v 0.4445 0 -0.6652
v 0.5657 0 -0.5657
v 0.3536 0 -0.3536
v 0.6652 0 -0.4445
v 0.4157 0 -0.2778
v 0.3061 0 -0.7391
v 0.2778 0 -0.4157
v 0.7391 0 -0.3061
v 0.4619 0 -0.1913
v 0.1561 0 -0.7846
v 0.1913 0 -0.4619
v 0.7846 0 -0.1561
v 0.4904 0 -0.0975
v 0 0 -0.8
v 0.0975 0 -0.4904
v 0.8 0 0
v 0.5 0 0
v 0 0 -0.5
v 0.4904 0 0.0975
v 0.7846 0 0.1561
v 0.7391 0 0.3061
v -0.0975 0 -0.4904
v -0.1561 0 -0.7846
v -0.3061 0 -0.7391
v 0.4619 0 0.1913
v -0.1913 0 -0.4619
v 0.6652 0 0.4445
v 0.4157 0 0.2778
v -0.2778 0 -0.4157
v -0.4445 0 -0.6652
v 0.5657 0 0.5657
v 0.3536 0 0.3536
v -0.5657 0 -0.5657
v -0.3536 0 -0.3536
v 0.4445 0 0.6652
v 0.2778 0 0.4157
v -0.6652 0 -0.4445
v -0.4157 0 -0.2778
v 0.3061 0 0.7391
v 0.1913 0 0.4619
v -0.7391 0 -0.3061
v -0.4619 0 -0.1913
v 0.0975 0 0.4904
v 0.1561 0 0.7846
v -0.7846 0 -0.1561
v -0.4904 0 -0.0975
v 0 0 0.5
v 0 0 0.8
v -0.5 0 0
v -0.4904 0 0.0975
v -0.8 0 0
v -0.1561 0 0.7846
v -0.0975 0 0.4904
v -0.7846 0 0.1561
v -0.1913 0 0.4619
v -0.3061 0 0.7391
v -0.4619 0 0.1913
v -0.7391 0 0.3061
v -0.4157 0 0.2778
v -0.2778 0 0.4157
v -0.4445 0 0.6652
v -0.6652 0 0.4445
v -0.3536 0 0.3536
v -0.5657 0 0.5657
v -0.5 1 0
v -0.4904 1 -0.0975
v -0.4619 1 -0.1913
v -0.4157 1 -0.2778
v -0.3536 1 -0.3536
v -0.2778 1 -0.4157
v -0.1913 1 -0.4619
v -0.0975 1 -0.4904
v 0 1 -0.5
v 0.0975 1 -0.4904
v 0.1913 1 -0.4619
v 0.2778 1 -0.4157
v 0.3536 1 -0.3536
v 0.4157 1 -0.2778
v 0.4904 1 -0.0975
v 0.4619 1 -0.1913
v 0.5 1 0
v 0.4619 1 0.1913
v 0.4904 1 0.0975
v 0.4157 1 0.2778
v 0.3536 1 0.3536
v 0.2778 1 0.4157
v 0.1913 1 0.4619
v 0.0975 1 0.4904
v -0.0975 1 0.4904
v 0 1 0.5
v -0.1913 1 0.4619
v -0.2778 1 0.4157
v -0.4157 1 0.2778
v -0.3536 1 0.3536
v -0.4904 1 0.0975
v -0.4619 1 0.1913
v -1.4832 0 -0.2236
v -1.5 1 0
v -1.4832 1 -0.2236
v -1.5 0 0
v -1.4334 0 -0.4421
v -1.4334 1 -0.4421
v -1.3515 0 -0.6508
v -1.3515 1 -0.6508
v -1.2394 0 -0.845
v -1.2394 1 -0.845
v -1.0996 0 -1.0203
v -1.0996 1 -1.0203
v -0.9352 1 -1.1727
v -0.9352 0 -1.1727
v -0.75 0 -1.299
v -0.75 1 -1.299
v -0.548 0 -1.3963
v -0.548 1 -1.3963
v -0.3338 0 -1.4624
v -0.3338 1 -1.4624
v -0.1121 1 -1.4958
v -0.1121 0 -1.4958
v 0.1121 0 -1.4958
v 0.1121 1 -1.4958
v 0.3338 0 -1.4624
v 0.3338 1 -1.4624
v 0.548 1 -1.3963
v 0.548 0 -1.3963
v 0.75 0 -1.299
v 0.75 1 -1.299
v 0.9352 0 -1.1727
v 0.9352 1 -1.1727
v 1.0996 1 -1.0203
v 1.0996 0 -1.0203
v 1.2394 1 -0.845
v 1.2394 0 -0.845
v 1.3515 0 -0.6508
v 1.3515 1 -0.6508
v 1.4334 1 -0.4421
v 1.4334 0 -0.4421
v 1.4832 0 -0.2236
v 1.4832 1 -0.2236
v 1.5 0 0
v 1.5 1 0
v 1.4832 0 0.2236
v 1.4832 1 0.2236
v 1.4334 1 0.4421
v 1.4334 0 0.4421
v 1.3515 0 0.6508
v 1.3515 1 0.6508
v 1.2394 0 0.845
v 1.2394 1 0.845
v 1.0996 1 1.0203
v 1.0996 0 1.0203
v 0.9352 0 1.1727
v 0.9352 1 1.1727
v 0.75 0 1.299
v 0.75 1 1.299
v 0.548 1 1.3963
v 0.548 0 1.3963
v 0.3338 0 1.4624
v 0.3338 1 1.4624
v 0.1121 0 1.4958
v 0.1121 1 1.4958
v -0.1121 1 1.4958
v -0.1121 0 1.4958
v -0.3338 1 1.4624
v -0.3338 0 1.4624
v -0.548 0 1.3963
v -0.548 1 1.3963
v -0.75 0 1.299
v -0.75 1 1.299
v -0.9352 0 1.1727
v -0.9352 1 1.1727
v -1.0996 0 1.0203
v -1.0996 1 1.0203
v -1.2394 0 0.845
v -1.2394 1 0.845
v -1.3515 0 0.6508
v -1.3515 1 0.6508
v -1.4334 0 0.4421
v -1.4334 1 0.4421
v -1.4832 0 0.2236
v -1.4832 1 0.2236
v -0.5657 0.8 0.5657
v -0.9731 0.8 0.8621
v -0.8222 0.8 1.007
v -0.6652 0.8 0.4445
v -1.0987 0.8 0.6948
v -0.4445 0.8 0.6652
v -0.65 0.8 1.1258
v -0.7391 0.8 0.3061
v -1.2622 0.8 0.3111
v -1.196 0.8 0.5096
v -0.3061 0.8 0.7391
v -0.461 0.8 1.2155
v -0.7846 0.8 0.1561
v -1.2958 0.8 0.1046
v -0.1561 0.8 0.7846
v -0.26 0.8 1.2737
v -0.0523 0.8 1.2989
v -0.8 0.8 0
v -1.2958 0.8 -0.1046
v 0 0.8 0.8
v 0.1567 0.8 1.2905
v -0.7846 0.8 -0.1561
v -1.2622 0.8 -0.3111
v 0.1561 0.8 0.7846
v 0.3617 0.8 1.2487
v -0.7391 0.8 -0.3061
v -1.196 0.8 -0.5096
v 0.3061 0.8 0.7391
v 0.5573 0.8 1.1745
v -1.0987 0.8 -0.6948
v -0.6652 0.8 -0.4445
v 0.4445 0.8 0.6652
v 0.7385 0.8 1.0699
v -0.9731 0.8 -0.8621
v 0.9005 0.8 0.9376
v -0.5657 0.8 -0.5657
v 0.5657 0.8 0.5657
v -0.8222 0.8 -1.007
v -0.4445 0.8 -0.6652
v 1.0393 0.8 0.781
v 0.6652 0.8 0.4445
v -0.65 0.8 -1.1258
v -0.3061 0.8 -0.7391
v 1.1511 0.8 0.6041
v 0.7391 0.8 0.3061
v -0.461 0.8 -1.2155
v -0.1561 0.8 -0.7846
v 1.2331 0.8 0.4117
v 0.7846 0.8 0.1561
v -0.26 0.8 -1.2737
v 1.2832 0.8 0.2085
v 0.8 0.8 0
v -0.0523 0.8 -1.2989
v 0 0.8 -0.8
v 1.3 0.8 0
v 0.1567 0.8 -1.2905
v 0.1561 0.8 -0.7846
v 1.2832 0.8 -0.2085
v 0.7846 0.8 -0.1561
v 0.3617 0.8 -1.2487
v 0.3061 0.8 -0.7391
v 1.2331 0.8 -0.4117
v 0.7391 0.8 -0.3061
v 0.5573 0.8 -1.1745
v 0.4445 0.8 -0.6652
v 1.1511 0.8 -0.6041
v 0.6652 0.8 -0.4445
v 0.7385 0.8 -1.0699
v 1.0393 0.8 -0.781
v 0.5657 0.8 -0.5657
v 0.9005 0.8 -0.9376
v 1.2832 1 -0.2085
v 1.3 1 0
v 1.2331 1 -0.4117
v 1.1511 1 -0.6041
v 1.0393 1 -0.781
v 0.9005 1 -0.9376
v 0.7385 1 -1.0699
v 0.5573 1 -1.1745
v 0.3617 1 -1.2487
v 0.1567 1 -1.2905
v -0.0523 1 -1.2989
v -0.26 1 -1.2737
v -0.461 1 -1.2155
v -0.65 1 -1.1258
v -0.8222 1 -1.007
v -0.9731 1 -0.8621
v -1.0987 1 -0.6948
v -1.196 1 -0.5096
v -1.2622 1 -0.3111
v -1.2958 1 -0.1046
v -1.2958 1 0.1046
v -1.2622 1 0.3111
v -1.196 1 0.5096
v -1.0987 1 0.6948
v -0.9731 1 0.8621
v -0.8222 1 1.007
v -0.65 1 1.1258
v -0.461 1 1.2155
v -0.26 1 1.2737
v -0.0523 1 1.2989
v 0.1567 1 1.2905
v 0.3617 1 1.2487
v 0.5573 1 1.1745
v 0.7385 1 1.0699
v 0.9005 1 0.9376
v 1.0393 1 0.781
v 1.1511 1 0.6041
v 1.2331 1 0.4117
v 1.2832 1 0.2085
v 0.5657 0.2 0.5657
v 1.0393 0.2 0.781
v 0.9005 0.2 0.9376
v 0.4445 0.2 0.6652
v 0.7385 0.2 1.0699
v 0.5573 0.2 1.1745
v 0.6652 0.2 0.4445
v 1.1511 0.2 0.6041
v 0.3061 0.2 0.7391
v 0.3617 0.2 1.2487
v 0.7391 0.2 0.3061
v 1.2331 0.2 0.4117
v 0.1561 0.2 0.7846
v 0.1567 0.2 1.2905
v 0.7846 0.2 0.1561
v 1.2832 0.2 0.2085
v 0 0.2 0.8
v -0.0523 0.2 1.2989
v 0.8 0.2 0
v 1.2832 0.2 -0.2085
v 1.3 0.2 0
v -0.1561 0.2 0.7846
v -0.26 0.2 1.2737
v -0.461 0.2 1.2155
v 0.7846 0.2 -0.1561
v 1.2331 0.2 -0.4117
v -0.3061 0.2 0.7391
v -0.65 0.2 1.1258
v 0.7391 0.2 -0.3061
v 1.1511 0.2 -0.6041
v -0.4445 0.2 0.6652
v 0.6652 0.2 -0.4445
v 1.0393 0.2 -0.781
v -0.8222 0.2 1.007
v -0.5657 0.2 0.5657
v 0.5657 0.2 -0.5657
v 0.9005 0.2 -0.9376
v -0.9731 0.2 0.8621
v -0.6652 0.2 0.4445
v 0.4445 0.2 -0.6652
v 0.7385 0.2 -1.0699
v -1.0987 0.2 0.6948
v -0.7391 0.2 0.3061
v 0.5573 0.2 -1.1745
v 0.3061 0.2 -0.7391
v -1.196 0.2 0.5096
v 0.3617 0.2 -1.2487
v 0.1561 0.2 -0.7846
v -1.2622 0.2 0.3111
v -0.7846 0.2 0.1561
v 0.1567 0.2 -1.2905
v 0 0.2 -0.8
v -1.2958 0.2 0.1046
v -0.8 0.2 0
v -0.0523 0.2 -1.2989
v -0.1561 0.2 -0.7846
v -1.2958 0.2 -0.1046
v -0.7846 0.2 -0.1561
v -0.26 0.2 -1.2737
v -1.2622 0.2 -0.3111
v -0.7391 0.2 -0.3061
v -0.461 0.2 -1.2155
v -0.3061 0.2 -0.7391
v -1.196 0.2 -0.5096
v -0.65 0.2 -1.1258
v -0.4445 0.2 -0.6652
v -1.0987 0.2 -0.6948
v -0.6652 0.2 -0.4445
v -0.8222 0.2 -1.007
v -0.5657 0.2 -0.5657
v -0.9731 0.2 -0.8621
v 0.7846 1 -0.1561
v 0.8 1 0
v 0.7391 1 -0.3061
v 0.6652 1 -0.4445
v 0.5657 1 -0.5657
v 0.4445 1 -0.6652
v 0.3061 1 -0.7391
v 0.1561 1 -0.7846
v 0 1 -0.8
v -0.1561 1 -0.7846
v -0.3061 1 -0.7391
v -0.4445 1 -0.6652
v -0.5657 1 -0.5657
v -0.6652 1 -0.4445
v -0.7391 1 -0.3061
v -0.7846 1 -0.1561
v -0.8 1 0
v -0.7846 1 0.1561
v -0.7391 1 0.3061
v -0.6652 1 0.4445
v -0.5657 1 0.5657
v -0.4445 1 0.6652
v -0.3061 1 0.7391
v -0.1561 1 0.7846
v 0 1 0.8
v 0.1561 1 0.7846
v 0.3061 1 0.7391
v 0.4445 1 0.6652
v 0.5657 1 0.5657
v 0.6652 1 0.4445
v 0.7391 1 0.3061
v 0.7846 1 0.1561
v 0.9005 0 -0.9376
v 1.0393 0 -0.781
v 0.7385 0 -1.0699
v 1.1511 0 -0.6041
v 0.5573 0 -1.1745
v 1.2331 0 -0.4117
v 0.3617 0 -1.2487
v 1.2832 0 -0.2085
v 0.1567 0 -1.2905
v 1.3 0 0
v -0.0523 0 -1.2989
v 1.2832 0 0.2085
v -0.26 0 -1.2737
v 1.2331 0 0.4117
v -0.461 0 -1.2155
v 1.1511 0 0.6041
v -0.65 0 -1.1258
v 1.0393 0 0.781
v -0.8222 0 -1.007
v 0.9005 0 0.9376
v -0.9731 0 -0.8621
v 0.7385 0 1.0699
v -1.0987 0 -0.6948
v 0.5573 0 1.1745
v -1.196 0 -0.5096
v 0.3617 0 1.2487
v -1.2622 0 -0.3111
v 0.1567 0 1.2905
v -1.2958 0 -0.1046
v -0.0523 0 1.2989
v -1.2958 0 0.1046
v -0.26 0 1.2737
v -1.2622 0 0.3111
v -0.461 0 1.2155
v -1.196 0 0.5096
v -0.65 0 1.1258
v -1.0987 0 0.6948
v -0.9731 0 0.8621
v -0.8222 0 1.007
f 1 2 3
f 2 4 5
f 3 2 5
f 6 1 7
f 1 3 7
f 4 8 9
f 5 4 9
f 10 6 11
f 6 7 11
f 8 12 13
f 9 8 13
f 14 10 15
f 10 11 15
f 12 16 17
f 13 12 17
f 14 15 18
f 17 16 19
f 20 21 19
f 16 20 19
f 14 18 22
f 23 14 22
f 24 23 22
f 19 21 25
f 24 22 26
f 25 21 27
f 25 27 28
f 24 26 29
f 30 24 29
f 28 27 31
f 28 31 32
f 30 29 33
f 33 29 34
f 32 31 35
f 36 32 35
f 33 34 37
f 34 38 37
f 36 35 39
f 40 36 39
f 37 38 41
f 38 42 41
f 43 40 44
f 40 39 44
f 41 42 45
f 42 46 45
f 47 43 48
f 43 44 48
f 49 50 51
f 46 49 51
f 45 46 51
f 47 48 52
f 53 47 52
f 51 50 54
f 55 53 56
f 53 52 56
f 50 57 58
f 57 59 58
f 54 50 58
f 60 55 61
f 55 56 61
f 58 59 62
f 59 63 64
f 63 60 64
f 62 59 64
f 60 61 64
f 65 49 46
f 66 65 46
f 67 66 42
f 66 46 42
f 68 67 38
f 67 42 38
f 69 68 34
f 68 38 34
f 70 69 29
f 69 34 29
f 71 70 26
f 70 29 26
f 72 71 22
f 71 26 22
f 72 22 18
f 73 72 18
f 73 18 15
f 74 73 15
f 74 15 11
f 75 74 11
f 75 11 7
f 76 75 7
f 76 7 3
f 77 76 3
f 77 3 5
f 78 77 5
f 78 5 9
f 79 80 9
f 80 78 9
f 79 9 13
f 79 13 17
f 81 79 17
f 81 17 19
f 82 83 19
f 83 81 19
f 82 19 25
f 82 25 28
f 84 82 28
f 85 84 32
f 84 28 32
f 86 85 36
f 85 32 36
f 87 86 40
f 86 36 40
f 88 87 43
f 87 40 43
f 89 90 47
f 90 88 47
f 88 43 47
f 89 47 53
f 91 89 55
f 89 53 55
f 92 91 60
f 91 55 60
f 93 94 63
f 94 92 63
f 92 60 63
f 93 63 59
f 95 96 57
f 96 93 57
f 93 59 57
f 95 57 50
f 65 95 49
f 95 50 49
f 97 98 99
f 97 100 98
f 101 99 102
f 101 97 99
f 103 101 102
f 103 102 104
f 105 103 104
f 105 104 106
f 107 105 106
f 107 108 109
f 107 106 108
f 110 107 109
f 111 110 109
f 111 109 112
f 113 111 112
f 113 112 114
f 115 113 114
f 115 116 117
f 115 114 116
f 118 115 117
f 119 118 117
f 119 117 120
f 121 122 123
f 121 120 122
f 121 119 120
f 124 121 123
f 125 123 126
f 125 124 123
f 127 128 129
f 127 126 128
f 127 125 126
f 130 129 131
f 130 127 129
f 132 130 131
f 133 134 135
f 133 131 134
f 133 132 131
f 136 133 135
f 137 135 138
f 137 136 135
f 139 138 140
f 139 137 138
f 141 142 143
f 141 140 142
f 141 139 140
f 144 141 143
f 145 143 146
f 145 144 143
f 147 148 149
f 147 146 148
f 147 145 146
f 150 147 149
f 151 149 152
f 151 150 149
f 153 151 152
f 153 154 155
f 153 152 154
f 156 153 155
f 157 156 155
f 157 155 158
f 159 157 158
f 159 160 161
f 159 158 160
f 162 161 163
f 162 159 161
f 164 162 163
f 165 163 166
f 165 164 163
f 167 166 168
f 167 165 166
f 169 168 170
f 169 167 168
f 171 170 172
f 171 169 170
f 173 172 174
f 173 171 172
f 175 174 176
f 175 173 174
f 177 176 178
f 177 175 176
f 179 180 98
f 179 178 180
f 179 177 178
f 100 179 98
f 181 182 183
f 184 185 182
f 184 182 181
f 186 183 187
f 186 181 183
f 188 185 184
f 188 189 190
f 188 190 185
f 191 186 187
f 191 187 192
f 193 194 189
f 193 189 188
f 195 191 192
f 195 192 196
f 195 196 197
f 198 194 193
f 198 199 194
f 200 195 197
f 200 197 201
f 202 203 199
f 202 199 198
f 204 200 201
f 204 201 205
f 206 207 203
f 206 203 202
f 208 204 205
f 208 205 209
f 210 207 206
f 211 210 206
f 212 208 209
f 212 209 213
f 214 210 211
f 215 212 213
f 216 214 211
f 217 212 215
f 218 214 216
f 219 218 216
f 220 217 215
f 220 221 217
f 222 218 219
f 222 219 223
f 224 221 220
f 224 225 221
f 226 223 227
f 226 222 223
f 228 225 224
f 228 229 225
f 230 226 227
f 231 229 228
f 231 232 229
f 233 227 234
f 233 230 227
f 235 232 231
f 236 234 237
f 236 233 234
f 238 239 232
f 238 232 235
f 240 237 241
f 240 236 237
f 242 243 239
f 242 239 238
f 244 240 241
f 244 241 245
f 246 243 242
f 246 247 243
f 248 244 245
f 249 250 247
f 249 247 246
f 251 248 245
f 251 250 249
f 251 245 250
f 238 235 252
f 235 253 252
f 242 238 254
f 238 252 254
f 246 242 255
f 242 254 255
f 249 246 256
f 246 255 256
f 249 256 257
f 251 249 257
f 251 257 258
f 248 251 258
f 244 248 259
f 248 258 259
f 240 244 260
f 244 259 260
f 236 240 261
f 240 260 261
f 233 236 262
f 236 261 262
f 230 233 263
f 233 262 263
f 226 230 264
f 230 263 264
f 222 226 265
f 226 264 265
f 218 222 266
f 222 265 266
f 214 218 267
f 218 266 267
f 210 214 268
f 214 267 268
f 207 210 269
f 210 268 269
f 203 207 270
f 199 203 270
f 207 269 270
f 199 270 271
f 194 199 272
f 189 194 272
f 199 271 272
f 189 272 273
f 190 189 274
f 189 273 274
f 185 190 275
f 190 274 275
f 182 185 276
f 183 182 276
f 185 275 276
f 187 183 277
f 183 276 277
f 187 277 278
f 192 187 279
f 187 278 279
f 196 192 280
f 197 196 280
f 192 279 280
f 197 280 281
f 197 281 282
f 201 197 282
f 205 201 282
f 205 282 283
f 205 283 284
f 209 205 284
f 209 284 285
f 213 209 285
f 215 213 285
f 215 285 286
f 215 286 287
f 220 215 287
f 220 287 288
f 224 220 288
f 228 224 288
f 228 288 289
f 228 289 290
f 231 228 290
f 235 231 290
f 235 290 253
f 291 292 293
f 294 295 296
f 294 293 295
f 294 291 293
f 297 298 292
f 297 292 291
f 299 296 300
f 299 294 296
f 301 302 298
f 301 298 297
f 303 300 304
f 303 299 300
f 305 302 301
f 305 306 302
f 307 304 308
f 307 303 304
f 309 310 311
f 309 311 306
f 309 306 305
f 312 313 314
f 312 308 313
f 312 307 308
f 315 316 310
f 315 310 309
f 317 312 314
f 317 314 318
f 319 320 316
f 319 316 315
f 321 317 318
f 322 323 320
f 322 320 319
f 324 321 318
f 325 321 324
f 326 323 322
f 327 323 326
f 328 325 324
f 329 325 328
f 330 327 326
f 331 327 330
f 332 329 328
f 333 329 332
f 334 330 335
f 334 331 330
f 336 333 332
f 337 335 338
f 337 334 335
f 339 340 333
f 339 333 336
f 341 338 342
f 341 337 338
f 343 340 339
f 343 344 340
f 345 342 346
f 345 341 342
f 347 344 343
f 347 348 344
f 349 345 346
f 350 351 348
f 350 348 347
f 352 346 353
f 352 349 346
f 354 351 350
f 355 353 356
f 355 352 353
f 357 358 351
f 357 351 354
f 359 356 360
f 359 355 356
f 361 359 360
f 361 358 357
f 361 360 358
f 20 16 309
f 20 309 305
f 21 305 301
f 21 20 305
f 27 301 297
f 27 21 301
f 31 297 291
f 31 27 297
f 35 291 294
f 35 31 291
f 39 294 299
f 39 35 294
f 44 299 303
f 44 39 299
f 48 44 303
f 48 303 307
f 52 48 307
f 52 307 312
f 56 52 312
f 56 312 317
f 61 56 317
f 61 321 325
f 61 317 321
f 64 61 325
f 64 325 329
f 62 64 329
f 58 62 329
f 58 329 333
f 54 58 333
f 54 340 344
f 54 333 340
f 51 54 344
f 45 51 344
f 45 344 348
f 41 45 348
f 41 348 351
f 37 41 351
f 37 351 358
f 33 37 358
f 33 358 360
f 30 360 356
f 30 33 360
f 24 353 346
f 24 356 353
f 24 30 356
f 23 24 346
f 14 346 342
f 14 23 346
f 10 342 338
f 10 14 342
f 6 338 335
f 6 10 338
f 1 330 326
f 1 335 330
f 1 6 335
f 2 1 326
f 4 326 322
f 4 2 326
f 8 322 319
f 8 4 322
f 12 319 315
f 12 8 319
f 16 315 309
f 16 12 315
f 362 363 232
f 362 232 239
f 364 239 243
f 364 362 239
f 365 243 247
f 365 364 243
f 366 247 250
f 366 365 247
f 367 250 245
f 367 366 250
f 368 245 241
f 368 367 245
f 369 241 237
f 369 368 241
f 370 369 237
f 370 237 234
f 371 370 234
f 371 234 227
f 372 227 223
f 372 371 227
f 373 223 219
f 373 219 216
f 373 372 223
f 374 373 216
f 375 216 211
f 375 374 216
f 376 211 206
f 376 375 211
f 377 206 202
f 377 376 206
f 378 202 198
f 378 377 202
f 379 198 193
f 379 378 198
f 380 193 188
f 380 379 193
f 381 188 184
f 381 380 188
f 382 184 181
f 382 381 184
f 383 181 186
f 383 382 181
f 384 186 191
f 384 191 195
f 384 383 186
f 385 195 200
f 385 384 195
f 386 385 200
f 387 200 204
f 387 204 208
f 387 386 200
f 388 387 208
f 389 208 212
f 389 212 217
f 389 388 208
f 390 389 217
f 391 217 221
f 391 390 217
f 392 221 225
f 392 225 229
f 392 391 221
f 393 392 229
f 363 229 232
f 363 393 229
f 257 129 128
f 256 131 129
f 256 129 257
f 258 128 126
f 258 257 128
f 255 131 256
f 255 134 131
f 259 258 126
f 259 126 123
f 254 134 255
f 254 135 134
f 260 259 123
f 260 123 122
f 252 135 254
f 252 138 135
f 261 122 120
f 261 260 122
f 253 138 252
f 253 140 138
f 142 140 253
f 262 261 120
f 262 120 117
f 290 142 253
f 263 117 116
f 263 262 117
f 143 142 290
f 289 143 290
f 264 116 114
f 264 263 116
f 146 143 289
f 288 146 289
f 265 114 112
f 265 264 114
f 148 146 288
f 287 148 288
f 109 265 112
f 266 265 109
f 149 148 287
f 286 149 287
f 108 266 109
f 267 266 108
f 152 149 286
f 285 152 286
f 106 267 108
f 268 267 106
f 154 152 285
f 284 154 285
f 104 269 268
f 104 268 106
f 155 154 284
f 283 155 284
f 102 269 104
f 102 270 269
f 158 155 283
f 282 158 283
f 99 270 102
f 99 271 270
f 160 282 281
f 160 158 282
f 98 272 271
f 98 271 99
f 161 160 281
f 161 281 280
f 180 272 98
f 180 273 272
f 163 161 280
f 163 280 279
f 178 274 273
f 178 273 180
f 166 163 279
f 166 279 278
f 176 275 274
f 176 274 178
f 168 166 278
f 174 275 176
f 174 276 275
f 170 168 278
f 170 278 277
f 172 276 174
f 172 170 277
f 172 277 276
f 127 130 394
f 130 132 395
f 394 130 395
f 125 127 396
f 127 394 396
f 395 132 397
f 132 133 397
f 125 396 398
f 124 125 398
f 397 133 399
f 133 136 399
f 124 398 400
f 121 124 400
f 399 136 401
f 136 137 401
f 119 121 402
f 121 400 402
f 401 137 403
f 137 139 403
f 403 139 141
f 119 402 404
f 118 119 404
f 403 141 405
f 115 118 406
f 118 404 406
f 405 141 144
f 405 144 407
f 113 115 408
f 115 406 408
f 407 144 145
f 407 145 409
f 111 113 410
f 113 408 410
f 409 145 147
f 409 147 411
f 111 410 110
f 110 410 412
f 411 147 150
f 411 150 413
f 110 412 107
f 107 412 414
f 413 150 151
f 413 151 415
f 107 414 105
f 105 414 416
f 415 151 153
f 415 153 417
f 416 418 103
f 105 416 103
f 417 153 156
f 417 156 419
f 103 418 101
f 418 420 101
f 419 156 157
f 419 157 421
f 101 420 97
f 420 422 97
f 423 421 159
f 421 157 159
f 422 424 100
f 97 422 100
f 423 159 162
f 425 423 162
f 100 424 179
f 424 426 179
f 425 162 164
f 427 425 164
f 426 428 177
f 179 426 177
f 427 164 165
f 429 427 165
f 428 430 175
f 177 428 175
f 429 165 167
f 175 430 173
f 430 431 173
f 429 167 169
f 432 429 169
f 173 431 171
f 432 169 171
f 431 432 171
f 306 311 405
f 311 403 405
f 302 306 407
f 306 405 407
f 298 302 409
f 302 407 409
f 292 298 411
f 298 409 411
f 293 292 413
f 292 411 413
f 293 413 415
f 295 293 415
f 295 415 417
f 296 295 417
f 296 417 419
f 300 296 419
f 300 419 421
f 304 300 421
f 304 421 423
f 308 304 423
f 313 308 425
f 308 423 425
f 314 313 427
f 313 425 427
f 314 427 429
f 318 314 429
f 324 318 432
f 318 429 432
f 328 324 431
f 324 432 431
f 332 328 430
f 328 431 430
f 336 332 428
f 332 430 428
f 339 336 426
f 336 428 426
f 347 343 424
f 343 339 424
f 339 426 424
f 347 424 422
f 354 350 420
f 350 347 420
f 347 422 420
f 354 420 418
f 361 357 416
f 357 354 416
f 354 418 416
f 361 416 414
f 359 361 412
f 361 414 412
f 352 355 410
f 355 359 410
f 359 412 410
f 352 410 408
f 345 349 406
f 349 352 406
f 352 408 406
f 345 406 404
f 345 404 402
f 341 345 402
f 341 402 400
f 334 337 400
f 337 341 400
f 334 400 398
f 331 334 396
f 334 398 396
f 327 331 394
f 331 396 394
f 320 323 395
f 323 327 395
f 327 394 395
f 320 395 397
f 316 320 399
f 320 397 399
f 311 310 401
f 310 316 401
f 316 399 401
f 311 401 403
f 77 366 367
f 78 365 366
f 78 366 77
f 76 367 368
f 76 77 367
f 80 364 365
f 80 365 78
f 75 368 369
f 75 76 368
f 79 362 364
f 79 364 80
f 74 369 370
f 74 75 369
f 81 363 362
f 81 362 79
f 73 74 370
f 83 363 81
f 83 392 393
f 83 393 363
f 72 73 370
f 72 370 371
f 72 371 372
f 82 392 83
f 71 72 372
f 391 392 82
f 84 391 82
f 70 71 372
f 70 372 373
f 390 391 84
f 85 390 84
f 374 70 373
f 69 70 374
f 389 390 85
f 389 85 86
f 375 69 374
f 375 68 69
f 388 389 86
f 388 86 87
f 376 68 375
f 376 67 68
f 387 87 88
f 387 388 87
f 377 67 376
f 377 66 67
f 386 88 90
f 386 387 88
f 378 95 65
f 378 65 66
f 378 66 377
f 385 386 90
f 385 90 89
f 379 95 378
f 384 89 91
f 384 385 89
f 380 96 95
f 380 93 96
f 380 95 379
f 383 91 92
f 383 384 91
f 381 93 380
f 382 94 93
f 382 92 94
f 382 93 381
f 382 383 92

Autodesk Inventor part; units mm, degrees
ref_plane "YZ Plane" through (0, 0, 0) normal (1, 0, 0) x (0, 1, 0)
ref_plane "XZ Plane" through (0, 0, 0) normal (0, 1, 0) x (-1, 0, 0)
ref_plane "XY Plane" through (0, 0, 0) normal (0, 0, 1) x (1, 0, 0)
sketch "Sketch1" plane through (0, 0, 0) normal (0, 1, 0) x (-1, 0, 0)
  circle A0 centre (0, 0) radius 0.5
  circle A1 centre (0, 0) radius 1.5
  dimension "d0" = 1
  dimension "d1" = 3
extrude "Extrusion1" add sketch "Sketch1" along normal blind 1
sketch "Sketch2" plane through (0, 1, 0) normal (0, 1, 0) x (1, 0, 0)
  circle A0 centre (0, 0) radius 0.8
  circle A1 centre (0, 0) radius 1.3
  circle A2 centre (0, 0) radius 1.5 projected
  circle A3 centre (0, 0) radius 0.5 projected
  dimension "d4" = 0.3
  dimension "d5" = 0.2
extrude "Extrusion2" cut sketch "Sketch2" against normal blind 0.2 contours A1
ref_plane "Work Plane1" through (0, 0.5, 0) normal (0, 1, 0) x (1, 0, 0)
mirror "Mirror1" about plane through (0, 0.5, 0) normal (0, 1, 0) of "Extrusion2"
properties part number "beraing_1_3_1"
